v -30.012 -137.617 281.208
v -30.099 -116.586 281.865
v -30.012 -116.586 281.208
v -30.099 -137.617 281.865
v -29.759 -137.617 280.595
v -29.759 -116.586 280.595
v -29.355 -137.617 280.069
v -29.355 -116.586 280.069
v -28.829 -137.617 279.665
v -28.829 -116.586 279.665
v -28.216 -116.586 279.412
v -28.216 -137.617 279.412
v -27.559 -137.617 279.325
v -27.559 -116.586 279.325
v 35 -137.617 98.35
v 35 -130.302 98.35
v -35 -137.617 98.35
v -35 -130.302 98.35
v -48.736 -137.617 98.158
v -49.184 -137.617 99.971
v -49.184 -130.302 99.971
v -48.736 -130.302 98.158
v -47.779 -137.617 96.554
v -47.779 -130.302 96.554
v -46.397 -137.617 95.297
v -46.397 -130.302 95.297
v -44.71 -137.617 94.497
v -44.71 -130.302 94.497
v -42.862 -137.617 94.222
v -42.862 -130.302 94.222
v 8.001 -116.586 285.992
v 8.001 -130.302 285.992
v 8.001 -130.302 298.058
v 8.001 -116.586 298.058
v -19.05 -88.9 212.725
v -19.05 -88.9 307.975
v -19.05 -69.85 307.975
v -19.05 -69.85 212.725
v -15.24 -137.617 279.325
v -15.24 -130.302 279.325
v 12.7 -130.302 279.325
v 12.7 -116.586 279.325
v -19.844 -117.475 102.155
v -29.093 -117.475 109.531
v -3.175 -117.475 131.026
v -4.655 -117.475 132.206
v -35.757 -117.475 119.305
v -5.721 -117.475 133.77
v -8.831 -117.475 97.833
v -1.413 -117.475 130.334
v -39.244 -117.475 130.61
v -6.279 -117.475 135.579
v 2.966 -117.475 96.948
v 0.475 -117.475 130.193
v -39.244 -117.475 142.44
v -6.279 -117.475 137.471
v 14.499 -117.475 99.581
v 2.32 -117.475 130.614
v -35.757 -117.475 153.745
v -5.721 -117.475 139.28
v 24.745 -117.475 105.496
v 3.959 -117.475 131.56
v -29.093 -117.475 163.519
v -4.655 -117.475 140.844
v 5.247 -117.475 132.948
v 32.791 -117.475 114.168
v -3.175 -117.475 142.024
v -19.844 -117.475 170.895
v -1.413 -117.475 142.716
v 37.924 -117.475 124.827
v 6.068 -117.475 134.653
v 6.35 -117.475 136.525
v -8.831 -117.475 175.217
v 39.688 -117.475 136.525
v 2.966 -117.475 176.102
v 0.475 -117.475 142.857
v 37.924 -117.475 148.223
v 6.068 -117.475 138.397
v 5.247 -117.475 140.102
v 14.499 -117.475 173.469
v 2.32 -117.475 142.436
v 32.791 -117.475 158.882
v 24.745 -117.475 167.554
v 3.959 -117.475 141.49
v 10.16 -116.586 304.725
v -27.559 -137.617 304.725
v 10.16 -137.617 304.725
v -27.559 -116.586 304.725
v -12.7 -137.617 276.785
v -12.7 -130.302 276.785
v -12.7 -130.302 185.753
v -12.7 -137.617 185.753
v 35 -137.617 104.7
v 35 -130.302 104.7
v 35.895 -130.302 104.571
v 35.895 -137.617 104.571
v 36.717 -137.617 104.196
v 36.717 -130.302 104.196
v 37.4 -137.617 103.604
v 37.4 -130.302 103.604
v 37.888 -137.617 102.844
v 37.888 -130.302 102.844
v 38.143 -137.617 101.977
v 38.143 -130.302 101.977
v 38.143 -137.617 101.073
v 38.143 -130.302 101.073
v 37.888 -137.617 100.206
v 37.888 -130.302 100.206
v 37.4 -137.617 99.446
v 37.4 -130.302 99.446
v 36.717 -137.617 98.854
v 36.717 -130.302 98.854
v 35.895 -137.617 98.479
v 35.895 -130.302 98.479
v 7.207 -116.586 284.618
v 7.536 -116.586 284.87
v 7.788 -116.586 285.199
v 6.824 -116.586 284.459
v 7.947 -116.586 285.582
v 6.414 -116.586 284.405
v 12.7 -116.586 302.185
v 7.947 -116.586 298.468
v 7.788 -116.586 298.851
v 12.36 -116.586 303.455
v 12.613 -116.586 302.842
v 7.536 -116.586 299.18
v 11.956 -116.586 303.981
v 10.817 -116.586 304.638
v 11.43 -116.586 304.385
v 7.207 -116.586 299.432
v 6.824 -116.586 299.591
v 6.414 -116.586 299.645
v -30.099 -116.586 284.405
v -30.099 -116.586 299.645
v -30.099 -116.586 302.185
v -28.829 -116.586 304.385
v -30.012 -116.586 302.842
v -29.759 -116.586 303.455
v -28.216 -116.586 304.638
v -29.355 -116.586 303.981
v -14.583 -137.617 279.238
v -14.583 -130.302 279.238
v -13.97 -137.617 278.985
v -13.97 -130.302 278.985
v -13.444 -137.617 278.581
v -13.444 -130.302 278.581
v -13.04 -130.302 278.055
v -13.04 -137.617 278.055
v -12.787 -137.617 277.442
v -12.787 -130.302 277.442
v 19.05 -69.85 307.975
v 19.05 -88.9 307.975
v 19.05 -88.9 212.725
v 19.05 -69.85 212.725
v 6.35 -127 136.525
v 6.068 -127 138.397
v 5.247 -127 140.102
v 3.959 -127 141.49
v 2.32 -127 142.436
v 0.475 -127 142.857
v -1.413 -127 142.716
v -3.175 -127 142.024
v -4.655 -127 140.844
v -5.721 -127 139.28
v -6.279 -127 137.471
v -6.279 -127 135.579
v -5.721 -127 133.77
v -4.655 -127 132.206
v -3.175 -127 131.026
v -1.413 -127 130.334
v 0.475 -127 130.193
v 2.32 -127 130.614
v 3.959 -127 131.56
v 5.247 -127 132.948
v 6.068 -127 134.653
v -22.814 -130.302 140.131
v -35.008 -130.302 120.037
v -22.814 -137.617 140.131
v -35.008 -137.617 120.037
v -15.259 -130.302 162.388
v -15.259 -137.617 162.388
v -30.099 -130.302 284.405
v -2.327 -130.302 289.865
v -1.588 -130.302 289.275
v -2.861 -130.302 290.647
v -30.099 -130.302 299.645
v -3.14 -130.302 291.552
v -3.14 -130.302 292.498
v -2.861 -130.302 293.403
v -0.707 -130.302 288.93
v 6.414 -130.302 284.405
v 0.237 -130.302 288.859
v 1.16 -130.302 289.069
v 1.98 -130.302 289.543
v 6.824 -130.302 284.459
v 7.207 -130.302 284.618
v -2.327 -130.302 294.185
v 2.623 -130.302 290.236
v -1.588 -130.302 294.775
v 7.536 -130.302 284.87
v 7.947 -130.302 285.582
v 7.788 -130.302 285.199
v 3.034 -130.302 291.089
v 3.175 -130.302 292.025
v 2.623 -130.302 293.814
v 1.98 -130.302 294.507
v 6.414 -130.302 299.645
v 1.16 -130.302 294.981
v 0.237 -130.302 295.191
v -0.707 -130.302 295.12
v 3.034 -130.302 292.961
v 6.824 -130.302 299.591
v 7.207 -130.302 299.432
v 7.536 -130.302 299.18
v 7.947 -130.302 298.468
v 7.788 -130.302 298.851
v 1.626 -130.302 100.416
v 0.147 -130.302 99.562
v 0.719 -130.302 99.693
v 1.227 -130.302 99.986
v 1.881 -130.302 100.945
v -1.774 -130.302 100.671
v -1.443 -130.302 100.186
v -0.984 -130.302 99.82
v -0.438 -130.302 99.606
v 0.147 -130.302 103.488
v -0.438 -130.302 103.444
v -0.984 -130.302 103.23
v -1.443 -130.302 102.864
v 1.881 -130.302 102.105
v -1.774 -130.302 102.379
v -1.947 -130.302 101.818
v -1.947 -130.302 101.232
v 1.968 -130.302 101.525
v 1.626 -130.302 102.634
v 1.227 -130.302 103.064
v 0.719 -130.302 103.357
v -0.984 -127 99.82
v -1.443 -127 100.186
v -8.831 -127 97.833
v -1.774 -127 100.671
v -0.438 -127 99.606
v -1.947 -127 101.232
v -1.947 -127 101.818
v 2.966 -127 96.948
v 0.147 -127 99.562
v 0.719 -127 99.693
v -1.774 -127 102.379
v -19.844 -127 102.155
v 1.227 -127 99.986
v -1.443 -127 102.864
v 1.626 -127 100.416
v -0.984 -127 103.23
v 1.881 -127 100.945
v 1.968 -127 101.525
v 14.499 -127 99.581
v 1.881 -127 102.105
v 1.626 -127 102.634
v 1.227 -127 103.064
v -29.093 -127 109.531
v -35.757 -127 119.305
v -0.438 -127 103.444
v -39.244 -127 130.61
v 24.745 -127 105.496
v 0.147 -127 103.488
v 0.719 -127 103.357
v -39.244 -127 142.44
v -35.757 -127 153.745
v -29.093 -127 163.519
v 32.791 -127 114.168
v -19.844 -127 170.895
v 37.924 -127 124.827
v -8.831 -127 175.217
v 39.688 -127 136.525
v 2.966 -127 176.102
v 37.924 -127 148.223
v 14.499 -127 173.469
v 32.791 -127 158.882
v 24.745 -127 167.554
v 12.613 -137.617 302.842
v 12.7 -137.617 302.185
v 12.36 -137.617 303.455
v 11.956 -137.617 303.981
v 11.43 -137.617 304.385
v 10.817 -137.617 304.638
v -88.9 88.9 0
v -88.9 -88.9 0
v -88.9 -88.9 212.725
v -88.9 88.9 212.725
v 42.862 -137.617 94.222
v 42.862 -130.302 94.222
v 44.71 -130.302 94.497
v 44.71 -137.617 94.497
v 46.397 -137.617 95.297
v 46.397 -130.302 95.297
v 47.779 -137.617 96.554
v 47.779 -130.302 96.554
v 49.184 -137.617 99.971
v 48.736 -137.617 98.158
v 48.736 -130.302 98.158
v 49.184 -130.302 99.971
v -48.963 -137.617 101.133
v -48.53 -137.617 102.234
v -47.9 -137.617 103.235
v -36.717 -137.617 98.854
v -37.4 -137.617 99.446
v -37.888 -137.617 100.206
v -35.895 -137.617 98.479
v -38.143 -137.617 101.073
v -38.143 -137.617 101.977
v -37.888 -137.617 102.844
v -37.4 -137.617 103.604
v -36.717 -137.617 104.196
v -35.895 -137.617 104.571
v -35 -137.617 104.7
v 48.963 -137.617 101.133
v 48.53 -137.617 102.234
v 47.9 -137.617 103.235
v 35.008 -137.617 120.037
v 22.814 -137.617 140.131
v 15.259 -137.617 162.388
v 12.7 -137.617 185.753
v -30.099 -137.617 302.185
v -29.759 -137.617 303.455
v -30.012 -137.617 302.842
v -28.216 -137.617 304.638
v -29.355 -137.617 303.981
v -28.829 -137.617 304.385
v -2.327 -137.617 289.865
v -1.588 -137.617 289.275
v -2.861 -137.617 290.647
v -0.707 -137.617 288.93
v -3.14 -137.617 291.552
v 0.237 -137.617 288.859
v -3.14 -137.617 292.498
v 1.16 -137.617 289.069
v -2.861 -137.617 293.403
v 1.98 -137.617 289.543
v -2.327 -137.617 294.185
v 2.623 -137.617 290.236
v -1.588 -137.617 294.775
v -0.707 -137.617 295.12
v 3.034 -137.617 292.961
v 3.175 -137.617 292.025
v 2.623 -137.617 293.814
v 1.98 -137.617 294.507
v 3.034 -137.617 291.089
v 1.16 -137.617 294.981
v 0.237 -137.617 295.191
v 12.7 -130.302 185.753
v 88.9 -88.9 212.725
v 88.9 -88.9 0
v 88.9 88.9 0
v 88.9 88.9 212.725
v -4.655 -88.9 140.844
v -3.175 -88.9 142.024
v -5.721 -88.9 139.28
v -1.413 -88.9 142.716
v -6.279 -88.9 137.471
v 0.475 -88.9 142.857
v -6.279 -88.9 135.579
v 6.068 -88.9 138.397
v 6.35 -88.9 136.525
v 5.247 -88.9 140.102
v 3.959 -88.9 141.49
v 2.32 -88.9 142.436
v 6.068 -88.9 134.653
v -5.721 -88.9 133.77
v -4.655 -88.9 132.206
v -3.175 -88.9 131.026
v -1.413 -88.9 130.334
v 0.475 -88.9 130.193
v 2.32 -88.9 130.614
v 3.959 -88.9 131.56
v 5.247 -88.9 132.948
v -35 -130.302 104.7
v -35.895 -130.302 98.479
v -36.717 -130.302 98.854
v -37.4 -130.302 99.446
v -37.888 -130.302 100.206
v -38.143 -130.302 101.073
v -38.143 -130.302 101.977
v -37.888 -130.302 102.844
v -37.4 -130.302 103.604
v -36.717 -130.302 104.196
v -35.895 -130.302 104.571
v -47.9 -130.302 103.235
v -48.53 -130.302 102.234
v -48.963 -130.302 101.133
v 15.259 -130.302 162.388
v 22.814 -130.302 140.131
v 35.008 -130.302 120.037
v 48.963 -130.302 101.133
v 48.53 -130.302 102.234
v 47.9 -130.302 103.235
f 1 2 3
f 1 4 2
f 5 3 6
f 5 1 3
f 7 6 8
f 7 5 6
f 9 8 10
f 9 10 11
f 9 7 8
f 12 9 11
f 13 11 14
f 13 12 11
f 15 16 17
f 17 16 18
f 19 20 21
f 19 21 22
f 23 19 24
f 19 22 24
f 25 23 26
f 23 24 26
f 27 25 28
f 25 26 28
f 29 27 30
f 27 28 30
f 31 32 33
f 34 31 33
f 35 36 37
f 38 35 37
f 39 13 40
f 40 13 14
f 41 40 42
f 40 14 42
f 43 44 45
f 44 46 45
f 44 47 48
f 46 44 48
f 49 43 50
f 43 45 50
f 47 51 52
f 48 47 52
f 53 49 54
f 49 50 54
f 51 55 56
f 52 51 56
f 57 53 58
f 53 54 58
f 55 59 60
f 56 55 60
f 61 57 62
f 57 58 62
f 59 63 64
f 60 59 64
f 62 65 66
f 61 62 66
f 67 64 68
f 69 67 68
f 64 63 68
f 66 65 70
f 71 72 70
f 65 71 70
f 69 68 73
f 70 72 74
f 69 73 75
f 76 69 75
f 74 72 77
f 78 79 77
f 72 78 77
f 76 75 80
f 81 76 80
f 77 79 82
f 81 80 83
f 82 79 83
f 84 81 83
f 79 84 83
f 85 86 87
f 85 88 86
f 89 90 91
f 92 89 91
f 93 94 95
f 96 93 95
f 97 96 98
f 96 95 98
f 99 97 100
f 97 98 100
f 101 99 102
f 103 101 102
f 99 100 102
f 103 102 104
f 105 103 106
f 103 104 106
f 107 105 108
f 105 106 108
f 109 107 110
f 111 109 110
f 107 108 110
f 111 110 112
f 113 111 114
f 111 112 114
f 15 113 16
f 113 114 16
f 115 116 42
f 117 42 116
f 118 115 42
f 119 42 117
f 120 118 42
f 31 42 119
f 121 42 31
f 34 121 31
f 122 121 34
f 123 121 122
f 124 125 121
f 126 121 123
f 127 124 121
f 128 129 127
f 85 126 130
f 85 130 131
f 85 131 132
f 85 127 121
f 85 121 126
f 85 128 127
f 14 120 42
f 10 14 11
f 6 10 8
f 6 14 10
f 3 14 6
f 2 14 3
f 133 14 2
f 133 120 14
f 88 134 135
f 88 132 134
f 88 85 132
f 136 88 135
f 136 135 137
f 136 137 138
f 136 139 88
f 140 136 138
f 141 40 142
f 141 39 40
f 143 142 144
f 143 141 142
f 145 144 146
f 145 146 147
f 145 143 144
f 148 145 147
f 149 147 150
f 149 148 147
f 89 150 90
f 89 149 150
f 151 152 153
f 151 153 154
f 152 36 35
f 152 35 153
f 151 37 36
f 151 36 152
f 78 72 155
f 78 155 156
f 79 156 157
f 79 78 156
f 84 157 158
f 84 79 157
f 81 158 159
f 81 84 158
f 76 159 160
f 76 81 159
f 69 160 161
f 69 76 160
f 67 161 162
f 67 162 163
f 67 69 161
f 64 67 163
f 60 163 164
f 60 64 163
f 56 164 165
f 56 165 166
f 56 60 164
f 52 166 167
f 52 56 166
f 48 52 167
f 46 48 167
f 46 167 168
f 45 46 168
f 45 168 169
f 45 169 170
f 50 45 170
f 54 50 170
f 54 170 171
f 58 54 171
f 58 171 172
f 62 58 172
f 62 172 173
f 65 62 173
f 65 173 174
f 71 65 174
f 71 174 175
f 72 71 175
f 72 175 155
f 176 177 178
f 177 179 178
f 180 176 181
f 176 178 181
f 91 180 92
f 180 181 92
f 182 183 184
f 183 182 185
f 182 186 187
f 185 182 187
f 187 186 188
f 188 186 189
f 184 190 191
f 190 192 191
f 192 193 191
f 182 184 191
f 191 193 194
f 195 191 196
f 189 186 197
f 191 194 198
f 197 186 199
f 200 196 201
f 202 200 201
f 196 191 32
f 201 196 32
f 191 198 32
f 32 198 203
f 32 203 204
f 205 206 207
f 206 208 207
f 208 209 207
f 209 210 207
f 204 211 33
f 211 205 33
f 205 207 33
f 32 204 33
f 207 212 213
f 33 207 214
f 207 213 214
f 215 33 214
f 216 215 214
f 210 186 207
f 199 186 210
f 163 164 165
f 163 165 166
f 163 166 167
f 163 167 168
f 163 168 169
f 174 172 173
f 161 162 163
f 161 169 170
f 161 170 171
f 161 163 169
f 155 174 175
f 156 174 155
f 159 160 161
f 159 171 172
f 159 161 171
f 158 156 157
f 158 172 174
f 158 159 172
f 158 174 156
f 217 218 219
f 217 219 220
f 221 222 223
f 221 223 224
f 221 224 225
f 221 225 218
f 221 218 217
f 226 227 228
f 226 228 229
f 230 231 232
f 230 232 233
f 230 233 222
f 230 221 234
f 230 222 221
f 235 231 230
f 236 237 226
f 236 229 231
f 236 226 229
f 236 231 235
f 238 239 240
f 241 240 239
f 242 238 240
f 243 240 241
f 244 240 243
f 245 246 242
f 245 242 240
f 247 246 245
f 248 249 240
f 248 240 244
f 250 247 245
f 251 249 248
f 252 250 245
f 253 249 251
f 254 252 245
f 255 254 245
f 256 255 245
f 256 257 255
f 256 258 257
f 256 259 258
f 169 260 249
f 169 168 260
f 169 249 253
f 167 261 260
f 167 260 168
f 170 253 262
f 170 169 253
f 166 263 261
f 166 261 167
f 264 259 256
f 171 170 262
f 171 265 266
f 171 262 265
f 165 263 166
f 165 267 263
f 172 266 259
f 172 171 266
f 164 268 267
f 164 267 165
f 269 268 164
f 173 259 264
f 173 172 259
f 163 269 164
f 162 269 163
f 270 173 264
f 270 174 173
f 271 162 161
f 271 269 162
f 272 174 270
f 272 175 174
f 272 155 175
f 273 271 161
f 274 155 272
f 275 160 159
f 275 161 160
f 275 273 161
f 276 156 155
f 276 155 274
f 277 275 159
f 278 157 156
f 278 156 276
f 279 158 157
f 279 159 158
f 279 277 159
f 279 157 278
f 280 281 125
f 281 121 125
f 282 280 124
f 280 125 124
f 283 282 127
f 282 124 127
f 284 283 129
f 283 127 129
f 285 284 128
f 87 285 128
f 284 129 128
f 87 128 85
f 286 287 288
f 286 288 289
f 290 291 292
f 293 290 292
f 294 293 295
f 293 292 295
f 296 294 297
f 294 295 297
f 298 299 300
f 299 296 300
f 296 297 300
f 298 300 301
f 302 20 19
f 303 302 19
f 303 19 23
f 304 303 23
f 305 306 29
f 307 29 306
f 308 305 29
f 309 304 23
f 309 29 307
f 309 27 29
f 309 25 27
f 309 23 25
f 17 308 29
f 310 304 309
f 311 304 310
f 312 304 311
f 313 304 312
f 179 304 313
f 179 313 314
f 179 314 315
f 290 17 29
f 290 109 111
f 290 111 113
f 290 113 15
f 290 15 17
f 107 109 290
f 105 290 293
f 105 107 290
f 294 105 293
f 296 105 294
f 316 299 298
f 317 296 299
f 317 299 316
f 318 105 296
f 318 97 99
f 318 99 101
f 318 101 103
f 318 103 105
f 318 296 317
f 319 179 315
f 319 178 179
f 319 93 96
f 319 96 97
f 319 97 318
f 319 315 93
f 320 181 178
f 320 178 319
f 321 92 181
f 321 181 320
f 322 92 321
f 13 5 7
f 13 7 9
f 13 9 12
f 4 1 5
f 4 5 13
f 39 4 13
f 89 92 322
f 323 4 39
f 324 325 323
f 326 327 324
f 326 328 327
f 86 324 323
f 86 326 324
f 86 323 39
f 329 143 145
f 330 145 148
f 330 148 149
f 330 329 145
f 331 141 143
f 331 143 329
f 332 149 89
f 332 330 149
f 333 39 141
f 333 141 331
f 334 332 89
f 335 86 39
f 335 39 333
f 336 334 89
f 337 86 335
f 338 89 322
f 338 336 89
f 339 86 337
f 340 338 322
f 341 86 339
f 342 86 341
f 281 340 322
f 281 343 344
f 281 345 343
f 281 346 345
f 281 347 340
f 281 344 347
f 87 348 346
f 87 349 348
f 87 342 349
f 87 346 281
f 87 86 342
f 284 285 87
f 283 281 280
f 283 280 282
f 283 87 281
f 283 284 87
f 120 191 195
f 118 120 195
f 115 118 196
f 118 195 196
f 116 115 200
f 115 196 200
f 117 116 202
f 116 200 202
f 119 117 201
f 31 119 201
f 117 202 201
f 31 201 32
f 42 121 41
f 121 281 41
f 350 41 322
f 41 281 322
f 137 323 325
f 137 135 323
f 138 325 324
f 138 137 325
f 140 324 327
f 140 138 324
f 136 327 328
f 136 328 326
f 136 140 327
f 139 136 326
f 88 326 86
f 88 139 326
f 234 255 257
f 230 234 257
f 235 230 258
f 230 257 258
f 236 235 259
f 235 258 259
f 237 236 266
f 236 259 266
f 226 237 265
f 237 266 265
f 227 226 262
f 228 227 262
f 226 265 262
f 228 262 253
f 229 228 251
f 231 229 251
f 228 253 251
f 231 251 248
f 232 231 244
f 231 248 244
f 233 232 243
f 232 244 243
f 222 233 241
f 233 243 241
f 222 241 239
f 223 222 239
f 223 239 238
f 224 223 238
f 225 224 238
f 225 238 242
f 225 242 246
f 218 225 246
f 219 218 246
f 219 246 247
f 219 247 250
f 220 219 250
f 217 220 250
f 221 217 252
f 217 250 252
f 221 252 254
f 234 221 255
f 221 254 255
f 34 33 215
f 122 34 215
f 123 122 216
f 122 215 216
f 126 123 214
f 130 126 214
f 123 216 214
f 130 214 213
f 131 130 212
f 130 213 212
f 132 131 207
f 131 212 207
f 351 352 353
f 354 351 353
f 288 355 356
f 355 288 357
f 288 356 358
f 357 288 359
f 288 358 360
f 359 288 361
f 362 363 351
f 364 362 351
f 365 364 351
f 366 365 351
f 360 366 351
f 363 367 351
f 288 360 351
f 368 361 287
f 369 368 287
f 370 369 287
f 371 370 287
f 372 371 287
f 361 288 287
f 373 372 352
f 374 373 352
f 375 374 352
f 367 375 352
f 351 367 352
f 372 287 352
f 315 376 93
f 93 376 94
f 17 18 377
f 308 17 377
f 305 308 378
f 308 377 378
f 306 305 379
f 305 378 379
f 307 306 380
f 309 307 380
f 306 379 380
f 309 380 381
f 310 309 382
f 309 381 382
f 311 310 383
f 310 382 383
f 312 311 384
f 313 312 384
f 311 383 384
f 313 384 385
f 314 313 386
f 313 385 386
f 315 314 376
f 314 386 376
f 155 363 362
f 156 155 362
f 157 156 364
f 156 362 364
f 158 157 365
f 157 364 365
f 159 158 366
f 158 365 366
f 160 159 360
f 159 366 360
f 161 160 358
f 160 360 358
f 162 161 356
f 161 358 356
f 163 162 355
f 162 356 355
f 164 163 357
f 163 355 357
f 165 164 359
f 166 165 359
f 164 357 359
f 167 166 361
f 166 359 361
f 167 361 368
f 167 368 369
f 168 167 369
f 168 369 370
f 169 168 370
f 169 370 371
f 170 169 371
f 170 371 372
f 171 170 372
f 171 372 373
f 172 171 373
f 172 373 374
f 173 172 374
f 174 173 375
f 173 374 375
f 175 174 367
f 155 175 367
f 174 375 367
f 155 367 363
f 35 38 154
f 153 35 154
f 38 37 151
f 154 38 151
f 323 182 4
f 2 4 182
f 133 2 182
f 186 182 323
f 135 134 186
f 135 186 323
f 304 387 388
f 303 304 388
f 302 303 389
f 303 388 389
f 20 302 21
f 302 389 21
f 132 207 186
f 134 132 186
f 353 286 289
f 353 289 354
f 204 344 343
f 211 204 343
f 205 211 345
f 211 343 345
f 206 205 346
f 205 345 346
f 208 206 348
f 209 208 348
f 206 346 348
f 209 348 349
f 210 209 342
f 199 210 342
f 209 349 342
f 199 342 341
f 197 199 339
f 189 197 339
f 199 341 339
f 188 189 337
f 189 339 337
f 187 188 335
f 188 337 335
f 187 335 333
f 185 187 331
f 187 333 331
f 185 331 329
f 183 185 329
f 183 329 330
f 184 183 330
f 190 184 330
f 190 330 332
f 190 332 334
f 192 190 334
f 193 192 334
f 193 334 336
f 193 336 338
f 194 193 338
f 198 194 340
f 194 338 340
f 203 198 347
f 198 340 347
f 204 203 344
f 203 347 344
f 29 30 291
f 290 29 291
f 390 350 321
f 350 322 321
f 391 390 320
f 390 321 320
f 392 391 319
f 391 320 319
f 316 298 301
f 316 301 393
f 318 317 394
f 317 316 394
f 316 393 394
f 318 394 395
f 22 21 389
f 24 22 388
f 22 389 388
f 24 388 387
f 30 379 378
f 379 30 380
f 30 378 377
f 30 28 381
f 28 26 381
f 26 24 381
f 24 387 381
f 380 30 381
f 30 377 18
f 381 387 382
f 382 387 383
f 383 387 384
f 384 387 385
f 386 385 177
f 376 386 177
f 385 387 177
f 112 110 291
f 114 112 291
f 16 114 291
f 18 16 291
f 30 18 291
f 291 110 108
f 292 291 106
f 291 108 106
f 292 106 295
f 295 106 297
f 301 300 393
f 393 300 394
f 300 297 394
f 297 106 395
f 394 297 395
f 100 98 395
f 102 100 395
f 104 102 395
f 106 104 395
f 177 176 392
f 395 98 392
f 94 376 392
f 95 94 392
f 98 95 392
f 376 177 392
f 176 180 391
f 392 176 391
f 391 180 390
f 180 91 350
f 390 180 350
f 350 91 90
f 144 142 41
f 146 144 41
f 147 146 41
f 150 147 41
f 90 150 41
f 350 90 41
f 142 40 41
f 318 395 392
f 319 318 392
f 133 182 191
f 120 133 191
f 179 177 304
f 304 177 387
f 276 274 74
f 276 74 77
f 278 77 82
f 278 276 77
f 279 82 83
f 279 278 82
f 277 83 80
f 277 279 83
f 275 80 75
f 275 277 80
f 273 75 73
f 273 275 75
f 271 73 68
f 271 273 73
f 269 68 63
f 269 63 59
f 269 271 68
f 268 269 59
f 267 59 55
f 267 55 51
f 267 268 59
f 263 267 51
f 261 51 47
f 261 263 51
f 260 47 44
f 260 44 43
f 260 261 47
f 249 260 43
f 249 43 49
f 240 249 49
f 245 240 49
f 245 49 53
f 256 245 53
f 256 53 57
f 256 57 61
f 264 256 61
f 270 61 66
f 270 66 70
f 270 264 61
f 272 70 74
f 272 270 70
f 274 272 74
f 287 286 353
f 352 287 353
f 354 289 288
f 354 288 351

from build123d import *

# Parameters (mm, degrees)
F0_W         = 177.8
F0_H         = 177.8
F1_DEPTH     = 212.725
F2_W         = 38.1
F2_H         = 19.05
F3_DEPTH     = 95.25
F4_R         = 6.35
F5_DEPTH     = 38.1
F6_R         = 39.6875
F7_DEPTH     = 9.525
F9_R         = 1.9685
F10_DEPTH    = 3.302
F12_DEPTH    = 7.3152
F14_T1_DEPTH = 18.0928727189
F14_T3_DEPTH = 39.0652
F15_R        = 107.95
F16_R        = 3.175
F17_DEPTH    = 7.3152
F19_DEPTH    = 13.716
F20_W        = 42.799
F20_H        = 25.4
F20_R        = 3.175
F21_DEPTH    = 7.3152
F22_R        = 2.54


# Not quite as in the source:
# - a fillet or chamfer that OpenCascade refuses, or shapes differently, is made with other operations: its cross-section is extruded or revolved along the edge and cut away or added


with BuildPart() as f1:
    # F0 (on Top) → F1 (new body)
    with BuildSketch(Plane.XY):
        Rectangle(F0_W, F0_H)
    extrude(amount=F1_DEPTH)

    # F4 (on face) → F5 (join)
    with BuildSketch(Plane.XZ.offset(88.9)):
        with Locations((0, 136.525)):
            Circle(F4_R)
    extrude(amount=F5_DEPTH)


with BuildPart() as f3:
    # F2 (on face) → F3 (new body)
    with BuildSketch(Plane.XY.offset(212.725)):
        with Locations((0, -79.375)):
            Rectangle(F2_W, F2_H)
    extrude(amount=F3_DEPTH)


with BuildPart() as f7:
    # F6 (on face) → F7 (new body)
    with BuildSketch(Plane.XZ.offset(127)):
        with Locations((0, 136.525)):
            Circle(F6_R)
    extrude(amount=-F7_DEPTH)

    # F8: cut F1
    add(f1.part, mode=Mode.SUBTRACT)

    # F9 (on face) → F10 (join)
    with BuildSketch(Plane.XZ.offset(127)):
        with Locations((0, 101.525)):
            Circle(F9_R)
    extrude(amount=F10_DEPTH)


with BuildPart() as f12:
    # F11 (on face) → F12 (new body)
    with BuildSketch(Plane.XZ.offset(130.302)):
        Polygon((-49.2125, 94.2225), (49.2125, 94.2225), (49.2125, 101.525), (12.7, 149.1090164259), (12.7, 304.725), (-12.7, 304.725), (-12.7, 149.1090164259), (-49.2125, 101.525), align=None)
        with BuildLine():
            Line((-35, 104.7), (35, 104.7))
            ThreePointArc((35, 104.7), (38.175, 101.525), (35, 98.35))
            Line((35, 98.35), (-35, 98.35))
            ThreePointArc((-35, 98.35), (-38.175, 101.525), (-35, 104.7))
        make_face(mode=Mode.SUBTRACT)
    extrude(amount=F12_DEPTH)

    # F14: fillet of radius 6.35 on 4 edges, made by hand

    # F14_s2 → F14_t1 (cut)
    with BuildSketch(Plane.XZ.offset(124.9131636405)):
        with BuildLine():
            ThreePointArc((-47.9002937108, 103.2351005304), (-48.8755063223, 101.4106060609), (-49.2125, 99.3694654562))
            Line((-49.2125, 99.3694654562), (-49.2125, 101.525))
            Line((-49.2125, 101.525), (-47.9002937108, 103.2351005304))
        make_face()
        with BuildLine():
            ThreePointArc((49.2125, 99.3694654562), (48.8755063223, 101.4106060609), (47.9002937108, 103.2351005304))
            Line((47.9002937108, 103.2351005304), (49.2125, 101.525))
            Line((49.2125, 101.525), (49.2125, 99.3694654562))
        make_face()
    extrude(amount=F14_T1_DEPTH, mode=Mode.SUBTRACT)

    # F14_s4 → F14_t3 (cut)
    with BuildSketch(Plane.XZ.offset(114.427)):
        with BuildLine():
            ThreePointArc((-49.2125, 100.5725), (-47.3526280605, 96.0823719395), (-42.8625, 94.2225))
            Line((-42.8625, 94.2225), (-49.2125, 94.2225))
            Line((-49.2125, 94.2225), (-49.2125, 100.5725))
        make_face()
        with BuildLine():
            ThreePointArc((42.8625, 94.2225), (47.3526280605, 96.0823719395), (49.2125, 100.5725))
            Line((49.2125, 100.5725), (49.2125, 94.2225))
            Line((49.2125, 94.2225), (42.8625, 94.2225))
        make_face()
    extrude(amount=F14_T3_DEPTH, mode=Mode.SUBTRACT)

    # F15
    f15_edges = [f12.edges().sort_by_distance(p)[0] for p in [
        (-12.7, -133.9596, 149.109016),
        (12.7, -133.9596, 149.109016),
    ]]
    fillet(f15_edges, radius=F15_R)

    # F16 (on face) → F17 (cut, through all)
    with BuildSketch(Plane.XZ.offset(137.6172)):
        with Locations((0, 292.025)):
            Circle(F16_R)
    extrude(amount=-F17_DEPTH, mode=Mode.SUBTRACT)

    # F18 (on face) → F19 (join)
    with BuildSketch(Plane(origin=(0, -130.302, 0), x_dir=(-1, 0, 0), z_dir=(0, 1, 0))):
        with BuildLine():
            Line((-6.4135, 299.645), (30.099, 299.645))
            Line((30.099, 299.645), (30.099, 304.725))
            Line((30.099, 304.725), (-12.7, 304.725))
            Line((-12.7, 304.725), (-12.7, 279.325))
            Line((-12.7, 279.325), (30.099, 279.325))
            Line((30.099, 279.325), (30.099, 284.405))
            Line((30.099, 284.405), (-6.4135, 284.405))
            ThreePointArc((-6.4135, 284.405), (-7.5360320151, 284.8699679849), (-8.001, 285.9925))
            Line((-8.001, 285.9925), (-8.001, 298.0575))
            ThreePointArc((-8.001, 298.0575), (-7.5360320151, 299.1800320151), (-6.4135, 299.645))
        make_face()
    extrude(amount=F19_DEPTH)

    # F20 (on face) → F21 (join, through all)
    with BuildSketch(Plane.XZ.offset(130.302)):
        with Locations((-8.6995, 292.025)):
            Rectangle(F20_W, F20_H)
        with Locations((0, 292.025)):
            Circle(F20_R, mode=Mode.SUBTRACT)
    extrude(amount=F21_DEPTH)

    # F22
    f22_edges = [f12.edges().sort_by_distance(p)[0] for p in [
        (-12.7, -133.9596, 279.325),
        (-30.099, -127.1016, 279.325),
        (-30.099, -127.1016, 304.725),
        (12.7, -127.1016, 304.725),
    ]]
    fillet(f22_edges, radius=F22_R)


solid = Compound([f1.part, f3.part, f7.part, f12.part])
